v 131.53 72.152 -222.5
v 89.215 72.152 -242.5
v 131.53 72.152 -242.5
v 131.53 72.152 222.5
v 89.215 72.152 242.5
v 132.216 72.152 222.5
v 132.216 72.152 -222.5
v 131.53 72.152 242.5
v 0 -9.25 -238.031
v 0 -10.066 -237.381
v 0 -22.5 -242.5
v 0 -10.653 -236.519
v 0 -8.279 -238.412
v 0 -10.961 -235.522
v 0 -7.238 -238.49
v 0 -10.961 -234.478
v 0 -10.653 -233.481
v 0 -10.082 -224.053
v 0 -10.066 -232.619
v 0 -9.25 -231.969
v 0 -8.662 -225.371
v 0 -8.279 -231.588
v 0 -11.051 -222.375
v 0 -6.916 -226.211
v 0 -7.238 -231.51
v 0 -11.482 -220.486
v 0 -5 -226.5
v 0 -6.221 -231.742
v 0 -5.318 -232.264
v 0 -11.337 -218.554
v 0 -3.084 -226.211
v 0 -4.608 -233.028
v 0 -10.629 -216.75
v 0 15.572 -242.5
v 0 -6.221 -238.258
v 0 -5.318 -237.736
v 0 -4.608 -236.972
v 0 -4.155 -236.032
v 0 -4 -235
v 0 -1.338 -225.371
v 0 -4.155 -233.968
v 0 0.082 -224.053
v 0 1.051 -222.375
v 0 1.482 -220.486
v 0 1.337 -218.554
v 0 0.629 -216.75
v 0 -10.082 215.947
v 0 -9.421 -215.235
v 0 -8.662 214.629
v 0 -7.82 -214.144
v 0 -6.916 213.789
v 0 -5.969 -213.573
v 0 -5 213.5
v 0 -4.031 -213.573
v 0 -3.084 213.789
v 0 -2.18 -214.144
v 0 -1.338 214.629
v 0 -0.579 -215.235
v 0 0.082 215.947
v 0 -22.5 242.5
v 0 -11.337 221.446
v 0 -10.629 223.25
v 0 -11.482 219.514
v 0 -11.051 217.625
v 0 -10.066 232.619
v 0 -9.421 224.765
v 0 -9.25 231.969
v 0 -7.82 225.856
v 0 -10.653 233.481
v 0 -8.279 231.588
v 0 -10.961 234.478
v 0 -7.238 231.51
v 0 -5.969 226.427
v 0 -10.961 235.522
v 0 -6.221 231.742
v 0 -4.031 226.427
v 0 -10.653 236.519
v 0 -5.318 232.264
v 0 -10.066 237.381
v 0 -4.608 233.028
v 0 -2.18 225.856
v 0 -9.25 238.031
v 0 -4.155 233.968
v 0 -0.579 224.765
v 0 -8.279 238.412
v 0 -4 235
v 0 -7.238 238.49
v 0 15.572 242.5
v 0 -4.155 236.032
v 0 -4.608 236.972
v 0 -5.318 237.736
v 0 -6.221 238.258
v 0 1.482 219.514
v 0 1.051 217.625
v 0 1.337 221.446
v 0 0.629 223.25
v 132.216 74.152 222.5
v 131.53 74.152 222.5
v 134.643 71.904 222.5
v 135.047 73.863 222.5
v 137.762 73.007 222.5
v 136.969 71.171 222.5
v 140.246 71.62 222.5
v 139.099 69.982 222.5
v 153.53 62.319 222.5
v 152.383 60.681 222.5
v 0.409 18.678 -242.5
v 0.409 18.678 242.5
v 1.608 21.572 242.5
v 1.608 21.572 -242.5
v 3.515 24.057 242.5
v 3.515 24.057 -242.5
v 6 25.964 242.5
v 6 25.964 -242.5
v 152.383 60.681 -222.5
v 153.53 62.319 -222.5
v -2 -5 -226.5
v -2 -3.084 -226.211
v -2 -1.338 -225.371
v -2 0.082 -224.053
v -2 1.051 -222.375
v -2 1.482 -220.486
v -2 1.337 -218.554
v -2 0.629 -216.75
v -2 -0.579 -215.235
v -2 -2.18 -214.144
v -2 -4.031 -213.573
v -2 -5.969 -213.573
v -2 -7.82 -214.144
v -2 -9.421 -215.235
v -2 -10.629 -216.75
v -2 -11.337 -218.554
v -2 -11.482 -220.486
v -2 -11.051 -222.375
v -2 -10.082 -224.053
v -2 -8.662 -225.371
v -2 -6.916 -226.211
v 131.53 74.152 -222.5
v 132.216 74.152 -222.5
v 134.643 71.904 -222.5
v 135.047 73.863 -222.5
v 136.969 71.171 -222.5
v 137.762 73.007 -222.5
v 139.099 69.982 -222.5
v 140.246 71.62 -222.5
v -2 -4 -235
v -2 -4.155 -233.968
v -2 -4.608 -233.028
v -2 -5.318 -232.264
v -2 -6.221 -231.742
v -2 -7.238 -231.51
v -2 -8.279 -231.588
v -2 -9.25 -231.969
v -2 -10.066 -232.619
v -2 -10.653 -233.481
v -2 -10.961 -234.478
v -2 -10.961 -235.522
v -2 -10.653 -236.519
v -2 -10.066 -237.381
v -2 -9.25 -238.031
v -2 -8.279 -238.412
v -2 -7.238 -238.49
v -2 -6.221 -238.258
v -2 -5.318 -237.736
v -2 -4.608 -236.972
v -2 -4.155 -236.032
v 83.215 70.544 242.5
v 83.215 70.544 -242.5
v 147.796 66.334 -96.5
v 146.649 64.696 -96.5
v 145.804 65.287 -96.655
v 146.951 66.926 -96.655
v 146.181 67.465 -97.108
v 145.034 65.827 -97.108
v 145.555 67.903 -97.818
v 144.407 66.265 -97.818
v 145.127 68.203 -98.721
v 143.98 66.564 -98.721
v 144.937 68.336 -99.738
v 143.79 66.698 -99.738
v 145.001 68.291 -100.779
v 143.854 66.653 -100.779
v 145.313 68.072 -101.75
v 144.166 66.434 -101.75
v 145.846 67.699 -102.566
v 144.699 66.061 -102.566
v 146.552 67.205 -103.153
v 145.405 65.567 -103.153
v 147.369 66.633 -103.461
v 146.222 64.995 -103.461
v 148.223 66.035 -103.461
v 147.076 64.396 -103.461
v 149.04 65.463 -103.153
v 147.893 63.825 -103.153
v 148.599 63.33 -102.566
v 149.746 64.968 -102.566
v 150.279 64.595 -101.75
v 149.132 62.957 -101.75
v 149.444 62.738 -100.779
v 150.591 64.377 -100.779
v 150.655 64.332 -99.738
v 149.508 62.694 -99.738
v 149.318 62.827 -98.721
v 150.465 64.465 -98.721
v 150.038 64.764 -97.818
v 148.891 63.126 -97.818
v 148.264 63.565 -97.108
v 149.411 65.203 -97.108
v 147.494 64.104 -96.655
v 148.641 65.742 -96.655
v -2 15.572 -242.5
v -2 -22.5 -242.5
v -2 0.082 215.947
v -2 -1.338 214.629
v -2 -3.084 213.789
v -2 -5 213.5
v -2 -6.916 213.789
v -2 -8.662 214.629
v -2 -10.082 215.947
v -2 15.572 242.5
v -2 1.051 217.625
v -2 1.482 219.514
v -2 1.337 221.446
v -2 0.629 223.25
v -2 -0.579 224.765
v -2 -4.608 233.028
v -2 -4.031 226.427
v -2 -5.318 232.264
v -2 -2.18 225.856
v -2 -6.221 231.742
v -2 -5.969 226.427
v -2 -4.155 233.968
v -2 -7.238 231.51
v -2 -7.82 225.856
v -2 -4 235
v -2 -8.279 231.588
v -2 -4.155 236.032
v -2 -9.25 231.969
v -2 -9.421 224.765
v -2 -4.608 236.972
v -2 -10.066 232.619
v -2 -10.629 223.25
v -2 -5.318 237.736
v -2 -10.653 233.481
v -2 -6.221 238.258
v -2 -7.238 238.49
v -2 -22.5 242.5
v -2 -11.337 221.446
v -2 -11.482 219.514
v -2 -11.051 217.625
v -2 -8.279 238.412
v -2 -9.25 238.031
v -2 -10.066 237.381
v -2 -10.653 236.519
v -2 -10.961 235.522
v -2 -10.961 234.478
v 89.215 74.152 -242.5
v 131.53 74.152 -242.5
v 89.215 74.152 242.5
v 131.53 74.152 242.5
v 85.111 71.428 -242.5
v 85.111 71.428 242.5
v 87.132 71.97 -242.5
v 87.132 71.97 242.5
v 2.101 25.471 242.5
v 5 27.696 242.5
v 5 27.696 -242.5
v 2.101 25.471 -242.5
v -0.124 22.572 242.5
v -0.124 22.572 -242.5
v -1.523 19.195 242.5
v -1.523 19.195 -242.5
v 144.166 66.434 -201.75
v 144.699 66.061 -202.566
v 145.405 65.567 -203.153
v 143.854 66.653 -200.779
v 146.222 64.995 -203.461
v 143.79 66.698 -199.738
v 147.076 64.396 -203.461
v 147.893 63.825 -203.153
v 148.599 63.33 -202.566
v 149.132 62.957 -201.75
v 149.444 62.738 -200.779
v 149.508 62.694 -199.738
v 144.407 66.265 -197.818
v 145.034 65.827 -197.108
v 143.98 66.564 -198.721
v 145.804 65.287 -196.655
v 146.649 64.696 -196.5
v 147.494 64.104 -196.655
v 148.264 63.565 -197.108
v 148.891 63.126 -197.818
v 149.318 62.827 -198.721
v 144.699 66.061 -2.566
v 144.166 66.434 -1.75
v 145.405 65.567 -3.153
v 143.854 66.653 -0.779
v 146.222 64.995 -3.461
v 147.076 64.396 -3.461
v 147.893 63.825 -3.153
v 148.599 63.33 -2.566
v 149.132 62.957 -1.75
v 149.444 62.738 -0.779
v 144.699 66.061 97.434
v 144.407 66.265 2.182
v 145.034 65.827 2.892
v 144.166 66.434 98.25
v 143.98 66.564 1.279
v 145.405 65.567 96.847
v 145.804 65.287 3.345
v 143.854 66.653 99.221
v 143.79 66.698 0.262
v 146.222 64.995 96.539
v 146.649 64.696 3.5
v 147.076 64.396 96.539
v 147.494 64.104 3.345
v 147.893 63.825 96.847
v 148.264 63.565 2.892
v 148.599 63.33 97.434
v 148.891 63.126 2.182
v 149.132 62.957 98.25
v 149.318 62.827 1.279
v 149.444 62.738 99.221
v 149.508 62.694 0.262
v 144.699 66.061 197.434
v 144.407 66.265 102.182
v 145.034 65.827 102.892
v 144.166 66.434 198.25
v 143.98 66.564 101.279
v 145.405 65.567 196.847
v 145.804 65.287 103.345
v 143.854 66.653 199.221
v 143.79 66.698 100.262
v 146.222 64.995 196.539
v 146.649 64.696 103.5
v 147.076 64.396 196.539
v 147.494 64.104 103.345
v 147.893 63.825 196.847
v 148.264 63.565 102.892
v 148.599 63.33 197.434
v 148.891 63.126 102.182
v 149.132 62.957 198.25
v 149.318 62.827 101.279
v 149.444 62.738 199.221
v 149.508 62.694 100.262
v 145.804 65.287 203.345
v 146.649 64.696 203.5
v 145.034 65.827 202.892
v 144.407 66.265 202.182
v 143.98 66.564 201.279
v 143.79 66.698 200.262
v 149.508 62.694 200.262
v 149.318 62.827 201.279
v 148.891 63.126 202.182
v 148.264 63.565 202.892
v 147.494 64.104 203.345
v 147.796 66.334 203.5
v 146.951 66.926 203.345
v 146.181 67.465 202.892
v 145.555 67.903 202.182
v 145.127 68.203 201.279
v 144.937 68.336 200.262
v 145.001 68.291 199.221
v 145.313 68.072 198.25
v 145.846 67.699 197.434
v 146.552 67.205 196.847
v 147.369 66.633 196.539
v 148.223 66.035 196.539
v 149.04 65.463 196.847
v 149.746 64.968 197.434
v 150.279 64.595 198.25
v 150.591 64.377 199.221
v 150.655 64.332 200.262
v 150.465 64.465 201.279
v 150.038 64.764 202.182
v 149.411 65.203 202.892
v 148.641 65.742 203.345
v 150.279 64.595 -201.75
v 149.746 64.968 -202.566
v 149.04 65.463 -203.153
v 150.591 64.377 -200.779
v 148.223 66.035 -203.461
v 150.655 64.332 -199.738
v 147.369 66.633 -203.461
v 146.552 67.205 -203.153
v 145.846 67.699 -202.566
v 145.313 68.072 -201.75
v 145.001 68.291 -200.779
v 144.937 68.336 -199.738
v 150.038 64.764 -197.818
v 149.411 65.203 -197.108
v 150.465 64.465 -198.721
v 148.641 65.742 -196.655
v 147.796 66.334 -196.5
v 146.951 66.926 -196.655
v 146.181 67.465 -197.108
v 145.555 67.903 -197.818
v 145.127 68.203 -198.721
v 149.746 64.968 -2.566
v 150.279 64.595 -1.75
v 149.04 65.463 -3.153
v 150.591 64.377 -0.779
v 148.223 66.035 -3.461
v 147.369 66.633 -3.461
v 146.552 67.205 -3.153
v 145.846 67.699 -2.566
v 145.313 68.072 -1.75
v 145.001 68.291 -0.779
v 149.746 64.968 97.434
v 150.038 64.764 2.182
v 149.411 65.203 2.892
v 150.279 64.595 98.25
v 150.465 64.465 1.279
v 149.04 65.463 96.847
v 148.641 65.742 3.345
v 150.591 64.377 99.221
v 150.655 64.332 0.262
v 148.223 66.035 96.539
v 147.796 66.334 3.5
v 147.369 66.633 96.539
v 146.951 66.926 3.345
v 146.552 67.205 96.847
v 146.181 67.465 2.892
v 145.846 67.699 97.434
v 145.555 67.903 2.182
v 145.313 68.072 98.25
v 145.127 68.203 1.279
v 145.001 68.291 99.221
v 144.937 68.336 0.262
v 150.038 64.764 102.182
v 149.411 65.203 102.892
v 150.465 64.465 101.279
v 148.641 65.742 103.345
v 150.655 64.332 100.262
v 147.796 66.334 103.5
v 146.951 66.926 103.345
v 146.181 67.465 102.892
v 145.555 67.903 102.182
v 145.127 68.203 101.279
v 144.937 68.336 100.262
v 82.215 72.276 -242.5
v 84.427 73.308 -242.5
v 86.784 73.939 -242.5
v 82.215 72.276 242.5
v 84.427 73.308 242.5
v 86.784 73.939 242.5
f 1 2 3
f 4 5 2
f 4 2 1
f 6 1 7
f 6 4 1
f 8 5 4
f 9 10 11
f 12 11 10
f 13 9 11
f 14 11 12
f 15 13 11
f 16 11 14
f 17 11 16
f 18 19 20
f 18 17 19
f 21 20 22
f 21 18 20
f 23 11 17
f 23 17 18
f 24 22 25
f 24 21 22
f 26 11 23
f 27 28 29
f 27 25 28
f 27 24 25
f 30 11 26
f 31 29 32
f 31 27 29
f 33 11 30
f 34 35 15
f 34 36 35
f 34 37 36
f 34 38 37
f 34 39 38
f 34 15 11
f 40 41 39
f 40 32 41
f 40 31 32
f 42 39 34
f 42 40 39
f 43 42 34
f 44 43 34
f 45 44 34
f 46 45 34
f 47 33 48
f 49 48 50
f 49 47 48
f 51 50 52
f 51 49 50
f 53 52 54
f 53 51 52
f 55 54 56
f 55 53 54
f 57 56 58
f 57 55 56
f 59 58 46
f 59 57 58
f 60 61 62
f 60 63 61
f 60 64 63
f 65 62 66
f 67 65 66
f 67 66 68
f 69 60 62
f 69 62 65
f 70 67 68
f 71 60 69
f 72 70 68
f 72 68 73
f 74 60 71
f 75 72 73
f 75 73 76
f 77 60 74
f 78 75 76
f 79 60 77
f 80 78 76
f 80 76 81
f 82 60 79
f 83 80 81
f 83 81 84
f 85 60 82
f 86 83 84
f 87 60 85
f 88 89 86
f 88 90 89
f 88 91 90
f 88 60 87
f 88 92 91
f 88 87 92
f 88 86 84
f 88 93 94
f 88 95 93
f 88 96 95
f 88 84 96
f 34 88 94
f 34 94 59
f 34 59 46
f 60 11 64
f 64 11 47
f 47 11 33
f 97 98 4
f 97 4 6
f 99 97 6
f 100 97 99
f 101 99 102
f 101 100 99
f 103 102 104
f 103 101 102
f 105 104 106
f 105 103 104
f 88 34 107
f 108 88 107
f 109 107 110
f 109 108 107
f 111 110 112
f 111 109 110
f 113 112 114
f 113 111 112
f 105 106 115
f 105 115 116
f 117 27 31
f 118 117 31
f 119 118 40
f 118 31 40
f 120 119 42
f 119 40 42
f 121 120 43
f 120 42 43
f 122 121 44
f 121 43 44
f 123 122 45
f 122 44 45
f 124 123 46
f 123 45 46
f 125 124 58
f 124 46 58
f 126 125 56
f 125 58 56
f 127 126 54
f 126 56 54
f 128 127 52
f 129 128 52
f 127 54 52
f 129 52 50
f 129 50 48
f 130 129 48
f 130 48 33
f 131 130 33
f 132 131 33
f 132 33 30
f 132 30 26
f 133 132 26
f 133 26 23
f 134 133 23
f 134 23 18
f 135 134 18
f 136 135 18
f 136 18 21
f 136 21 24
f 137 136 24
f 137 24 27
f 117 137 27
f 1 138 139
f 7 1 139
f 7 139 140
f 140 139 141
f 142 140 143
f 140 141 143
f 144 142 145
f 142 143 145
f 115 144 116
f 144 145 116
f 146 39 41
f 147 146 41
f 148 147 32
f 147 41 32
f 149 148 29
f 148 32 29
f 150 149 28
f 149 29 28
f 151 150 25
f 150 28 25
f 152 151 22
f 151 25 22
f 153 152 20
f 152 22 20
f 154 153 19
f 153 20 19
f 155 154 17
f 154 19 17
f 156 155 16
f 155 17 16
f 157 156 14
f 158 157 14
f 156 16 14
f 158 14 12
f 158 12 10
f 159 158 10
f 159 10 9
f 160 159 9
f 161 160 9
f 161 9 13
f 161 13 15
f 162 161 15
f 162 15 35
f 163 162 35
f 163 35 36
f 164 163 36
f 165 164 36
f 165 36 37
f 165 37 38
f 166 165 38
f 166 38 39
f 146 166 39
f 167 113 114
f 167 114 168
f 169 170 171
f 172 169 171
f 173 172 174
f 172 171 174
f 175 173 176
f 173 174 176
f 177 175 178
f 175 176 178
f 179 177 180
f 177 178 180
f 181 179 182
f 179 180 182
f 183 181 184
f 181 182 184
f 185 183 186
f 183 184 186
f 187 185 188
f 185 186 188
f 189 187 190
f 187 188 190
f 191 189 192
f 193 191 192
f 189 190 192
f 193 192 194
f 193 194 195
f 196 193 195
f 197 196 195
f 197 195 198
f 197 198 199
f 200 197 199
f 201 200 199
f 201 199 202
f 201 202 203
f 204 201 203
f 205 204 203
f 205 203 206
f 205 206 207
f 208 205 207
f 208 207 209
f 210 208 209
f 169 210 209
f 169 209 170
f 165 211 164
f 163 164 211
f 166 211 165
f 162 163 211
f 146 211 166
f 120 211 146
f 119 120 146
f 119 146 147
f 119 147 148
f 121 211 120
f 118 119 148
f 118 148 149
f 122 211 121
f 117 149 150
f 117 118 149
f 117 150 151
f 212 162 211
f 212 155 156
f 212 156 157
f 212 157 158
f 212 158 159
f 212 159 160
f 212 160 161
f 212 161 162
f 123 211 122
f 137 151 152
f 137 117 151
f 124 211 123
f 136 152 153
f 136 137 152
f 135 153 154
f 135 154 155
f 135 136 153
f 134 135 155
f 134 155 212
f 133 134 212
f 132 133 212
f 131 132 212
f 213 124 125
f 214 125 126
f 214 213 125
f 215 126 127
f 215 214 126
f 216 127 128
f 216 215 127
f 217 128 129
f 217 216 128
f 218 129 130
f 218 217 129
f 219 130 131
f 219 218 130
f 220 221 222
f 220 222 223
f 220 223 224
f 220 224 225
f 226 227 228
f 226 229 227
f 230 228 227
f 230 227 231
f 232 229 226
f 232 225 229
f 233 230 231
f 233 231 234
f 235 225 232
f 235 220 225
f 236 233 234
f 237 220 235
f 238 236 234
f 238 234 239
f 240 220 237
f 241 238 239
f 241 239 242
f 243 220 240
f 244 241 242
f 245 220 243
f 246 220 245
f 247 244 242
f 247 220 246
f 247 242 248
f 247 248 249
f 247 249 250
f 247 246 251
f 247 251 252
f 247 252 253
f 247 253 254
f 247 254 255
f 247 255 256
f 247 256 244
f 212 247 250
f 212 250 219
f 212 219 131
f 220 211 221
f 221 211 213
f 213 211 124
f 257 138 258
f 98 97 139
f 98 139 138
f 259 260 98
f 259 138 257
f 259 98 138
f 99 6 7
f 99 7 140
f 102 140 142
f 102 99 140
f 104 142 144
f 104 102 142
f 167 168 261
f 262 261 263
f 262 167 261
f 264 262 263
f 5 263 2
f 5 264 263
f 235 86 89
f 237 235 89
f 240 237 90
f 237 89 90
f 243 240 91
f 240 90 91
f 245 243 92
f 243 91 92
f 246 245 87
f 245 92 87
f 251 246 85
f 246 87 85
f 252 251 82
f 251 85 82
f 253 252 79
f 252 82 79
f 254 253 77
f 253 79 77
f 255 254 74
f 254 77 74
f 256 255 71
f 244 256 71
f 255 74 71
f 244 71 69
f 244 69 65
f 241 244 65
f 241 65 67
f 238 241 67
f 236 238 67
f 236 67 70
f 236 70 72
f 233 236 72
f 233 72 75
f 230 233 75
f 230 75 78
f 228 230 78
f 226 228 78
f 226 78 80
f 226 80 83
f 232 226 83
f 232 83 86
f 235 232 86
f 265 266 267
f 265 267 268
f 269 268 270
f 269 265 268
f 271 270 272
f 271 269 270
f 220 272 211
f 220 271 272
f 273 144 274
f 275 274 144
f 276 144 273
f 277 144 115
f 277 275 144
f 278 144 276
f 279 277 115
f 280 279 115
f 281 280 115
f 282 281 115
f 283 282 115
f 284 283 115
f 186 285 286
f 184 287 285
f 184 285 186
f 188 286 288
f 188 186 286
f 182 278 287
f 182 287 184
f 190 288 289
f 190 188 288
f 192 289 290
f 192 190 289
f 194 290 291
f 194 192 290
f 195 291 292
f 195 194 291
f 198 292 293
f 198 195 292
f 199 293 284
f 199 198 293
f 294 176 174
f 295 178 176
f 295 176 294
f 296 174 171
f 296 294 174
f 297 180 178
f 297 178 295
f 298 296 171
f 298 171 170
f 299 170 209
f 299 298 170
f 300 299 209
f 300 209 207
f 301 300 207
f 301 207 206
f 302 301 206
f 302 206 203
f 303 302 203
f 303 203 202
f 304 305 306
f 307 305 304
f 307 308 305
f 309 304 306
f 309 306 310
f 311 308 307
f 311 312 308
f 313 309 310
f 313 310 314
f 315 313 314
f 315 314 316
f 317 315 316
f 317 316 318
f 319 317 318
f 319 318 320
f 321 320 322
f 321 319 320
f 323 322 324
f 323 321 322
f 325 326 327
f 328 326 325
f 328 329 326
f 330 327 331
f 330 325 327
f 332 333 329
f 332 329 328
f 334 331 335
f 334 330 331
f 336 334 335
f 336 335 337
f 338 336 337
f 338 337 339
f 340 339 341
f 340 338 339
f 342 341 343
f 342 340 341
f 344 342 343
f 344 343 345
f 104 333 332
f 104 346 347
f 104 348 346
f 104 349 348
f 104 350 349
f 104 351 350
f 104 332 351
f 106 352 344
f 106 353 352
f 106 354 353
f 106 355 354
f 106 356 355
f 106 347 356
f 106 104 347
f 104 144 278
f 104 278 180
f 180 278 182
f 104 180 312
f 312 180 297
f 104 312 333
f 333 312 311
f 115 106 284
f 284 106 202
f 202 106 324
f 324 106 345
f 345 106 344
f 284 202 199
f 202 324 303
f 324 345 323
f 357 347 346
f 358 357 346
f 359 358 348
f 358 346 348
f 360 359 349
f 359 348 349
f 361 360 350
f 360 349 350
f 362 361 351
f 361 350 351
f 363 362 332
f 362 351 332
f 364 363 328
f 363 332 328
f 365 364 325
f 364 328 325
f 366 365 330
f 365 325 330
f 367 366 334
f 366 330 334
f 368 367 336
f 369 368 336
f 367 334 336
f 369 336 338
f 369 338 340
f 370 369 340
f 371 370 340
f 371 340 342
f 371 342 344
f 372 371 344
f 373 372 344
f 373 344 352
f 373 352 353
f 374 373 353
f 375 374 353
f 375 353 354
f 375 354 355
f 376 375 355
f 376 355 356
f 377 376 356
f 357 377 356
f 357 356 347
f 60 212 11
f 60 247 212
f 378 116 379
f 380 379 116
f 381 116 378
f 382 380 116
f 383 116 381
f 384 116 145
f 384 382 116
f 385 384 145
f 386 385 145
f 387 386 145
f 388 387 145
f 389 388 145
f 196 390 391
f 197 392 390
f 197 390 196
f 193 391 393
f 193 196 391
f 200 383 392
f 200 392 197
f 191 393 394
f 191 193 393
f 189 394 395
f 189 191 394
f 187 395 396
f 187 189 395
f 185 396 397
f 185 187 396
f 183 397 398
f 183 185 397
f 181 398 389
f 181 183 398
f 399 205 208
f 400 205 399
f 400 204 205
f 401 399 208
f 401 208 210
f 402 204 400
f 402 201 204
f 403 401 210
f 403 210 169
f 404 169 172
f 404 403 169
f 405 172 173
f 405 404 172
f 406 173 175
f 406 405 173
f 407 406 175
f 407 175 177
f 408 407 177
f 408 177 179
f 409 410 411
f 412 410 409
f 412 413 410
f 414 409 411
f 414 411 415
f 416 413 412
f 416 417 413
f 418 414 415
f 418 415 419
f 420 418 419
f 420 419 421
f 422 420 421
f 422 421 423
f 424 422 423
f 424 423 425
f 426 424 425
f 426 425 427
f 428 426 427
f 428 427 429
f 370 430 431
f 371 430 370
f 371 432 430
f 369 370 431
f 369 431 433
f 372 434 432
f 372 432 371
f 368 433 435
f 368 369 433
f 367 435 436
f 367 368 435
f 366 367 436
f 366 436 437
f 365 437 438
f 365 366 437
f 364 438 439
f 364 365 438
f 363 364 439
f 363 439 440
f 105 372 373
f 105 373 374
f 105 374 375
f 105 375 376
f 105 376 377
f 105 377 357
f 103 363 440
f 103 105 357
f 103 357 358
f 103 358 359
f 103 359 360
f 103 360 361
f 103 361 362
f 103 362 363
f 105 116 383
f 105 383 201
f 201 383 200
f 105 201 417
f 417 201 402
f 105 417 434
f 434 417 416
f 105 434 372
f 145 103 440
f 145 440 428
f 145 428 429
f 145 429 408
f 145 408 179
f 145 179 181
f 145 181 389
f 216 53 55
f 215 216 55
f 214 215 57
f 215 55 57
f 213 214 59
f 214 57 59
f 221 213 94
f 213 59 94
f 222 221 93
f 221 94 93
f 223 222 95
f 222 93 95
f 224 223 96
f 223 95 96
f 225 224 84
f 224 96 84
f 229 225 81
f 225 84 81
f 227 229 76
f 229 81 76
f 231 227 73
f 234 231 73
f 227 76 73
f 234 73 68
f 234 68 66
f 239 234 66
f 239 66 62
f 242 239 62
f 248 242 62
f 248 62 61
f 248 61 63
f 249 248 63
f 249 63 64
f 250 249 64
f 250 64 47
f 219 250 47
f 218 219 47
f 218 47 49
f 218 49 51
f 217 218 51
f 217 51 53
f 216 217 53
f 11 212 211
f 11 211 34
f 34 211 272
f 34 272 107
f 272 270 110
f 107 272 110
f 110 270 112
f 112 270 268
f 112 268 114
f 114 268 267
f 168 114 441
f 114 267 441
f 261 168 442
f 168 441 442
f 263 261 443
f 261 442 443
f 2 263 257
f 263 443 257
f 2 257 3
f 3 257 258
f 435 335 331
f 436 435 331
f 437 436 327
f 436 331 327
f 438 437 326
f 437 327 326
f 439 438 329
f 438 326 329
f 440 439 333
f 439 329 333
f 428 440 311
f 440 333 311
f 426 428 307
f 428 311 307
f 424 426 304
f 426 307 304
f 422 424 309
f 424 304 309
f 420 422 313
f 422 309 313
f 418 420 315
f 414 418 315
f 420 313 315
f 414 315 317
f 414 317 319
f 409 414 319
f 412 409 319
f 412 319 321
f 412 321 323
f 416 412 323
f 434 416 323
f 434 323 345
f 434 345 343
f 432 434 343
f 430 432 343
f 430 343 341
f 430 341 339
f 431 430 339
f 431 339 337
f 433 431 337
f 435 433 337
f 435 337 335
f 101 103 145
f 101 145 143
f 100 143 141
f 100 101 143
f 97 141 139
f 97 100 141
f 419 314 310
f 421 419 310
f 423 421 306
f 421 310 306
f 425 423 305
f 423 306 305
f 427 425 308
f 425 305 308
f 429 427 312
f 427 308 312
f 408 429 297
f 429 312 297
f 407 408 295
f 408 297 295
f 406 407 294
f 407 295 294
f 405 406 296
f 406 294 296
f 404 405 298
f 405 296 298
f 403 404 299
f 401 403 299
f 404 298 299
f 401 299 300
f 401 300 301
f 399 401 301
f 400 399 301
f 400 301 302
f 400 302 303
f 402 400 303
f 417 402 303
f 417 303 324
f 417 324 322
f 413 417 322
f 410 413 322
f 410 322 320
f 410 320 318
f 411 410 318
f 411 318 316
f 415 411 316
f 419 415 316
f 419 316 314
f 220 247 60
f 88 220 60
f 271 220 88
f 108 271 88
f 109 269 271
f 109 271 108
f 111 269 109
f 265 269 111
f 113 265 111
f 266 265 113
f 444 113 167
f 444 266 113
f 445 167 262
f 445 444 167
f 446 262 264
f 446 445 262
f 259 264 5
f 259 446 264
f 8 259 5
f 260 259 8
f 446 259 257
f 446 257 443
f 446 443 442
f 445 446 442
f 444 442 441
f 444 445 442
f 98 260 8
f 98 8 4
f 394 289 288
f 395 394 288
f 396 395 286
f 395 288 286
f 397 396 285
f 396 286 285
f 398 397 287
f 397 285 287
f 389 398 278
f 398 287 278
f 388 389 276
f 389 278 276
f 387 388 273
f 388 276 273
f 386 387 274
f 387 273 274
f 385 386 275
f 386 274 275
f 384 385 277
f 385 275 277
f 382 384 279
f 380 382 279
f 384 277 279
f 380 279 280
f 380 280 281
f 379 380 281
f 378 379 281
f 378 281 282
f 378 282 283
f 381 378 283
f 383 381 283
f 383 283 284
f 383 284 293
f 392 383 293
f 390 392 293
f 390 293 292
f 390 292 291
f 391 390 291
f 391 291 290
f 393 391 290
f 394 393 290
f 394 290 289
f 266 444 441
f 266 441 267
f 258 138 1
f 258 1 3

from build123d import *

# Parameters (mm, degrees)
BASIS_BLECH1_DEPTH               = 242.5
SKIZZE4_W                        = 22
SKIZZE4_H                        = 20
SCHNITT_LINEAR_AUSTRAGEN1_DEPTH  = 303.852114579
F_7_0_7_DURCHMESSER_BOHRUNG1_D   = 7
F_13_0_13_DURCHMESSER_BOHRUNG1_D = 13
F_7_0_7_DURCHMESSER_BOHRUNG2_D   = 7


# Sheet-metal steps are written as plain solids
with BuildPart() as part:
    # Skizze1 → Basis-Blech1 (new, symmetric)
    with BuildSketch(Plane.XY):
        with BuildLine():
            Line((0, -22.5), (0, 15.57179677))
            ThreePointArc((0, 15.57179677), (1.607695155, 21.57179677), (6, 25.964101615))
            Line((6, 25.964101615), (83.215390309, 70.544427996))
            ThreePointArc((83.215390309, 70.544427996), (86.109561768, 71.743233066), (89.215390309, 72.15212315))
            Line((89.215390309, 72.15212315), (132.216414533, 72.15212315))
            ThreePointArc((132.216414533, 72.15212315), (135.824884128, 71.596726559), (139.09933177, 69.981947682))
            Line((139.09933177, 69.981947682), (152.383040886, 60.680594423))
            Line((152.383040886, 60.680594423), (153.530193758, 62.318898512))
            Line((153.530193758, 62.318898512), (140.246484642, 71.62025177))
            ThreePointArc((140.246484642, 71.62025177), (136.426295727, 73.504160461), (132.216414533, 74.15212315))
            Line((132.216414533, 74.15212315), (89.215390309, 74.15212315))
            ThreePointArc((89.215390309, 74.15212315), (85.591923678, 73.675084718), (82.215390309, 72.276478803))
            Line((82.215390309, 72.276478803), (5, 27.696152423))
            ThreePointArc((5, 27.696152423), (-0.124355653, 22.57179677), (-2, 15.57179677))
            Line((-2, 15.57179677), (-2, -22.5))
            Line((-2, -22.5), (0, -22.5))
        make_face()
    extrude(amount=BASIS_BLECH1_DEPTH, both=True)

    # Skizze4 → Schnitt-Linear austragen1 (cut, through all)
    with BuildSketch(Plane(origin=(0, 74.15212315, 0), x_dir=(1, 0, 0), z_dir=(0, 1, 0))):
        with Locations((142.530193758, 232.5)):
            Rectangle(SKIZZE4_W, SKIZZE4_H)
        with Locations((142.530193758, -232.5)):
            Rectangle(SKIZZE4_W, SKIZZE4_H)
    extrude(amount=-SCHNITT_LINEAR_AUSTRAGEN1_DEPTH, mode=Mode.SUBTRACT)

    # Ø7.0 (7) Durchmesser Bohrung1 (through all)
    with Locations(Plane(origin=(-2, 72.15212315, 0), x_dir=(0, -1, 0), z_dir=(-1, 0, 0))):
        with Locations((79.65212315, 235), (79.65212315, -235)):
            Hole(F_7_0_7_DURCHMESSER_BOHRUNG1_D / 2)

    # Ø13.0 (13) Durchmesser Bohrung1 (through all)
    with Locations(Plane.ZY.offset(2)):
        with Locations((-220, -5), (220, -5)):
            Hole(F_13_0_13_DURCHMESSER_BOHRUNG1_D / 2)

    # Ø7.0 (7) Durchmesser Bohrung2 (through all)
    with Locations(Plane(origin=(79.790191976, 113.952203628, 0), x_dir=(0, 0, -1), z_dir=(0.5735764363510463, 0.8191520442889918, 0))):
        with Locations((0, -83.019920352), (-100, -83.019920352), (-200, -83.019920352), (100, -83.019920352), (200, -83.019920352)):
            Hole(F_7_0_7_DURCHMESSER_BOHRUNG2_D / 2)


solid = part.part
